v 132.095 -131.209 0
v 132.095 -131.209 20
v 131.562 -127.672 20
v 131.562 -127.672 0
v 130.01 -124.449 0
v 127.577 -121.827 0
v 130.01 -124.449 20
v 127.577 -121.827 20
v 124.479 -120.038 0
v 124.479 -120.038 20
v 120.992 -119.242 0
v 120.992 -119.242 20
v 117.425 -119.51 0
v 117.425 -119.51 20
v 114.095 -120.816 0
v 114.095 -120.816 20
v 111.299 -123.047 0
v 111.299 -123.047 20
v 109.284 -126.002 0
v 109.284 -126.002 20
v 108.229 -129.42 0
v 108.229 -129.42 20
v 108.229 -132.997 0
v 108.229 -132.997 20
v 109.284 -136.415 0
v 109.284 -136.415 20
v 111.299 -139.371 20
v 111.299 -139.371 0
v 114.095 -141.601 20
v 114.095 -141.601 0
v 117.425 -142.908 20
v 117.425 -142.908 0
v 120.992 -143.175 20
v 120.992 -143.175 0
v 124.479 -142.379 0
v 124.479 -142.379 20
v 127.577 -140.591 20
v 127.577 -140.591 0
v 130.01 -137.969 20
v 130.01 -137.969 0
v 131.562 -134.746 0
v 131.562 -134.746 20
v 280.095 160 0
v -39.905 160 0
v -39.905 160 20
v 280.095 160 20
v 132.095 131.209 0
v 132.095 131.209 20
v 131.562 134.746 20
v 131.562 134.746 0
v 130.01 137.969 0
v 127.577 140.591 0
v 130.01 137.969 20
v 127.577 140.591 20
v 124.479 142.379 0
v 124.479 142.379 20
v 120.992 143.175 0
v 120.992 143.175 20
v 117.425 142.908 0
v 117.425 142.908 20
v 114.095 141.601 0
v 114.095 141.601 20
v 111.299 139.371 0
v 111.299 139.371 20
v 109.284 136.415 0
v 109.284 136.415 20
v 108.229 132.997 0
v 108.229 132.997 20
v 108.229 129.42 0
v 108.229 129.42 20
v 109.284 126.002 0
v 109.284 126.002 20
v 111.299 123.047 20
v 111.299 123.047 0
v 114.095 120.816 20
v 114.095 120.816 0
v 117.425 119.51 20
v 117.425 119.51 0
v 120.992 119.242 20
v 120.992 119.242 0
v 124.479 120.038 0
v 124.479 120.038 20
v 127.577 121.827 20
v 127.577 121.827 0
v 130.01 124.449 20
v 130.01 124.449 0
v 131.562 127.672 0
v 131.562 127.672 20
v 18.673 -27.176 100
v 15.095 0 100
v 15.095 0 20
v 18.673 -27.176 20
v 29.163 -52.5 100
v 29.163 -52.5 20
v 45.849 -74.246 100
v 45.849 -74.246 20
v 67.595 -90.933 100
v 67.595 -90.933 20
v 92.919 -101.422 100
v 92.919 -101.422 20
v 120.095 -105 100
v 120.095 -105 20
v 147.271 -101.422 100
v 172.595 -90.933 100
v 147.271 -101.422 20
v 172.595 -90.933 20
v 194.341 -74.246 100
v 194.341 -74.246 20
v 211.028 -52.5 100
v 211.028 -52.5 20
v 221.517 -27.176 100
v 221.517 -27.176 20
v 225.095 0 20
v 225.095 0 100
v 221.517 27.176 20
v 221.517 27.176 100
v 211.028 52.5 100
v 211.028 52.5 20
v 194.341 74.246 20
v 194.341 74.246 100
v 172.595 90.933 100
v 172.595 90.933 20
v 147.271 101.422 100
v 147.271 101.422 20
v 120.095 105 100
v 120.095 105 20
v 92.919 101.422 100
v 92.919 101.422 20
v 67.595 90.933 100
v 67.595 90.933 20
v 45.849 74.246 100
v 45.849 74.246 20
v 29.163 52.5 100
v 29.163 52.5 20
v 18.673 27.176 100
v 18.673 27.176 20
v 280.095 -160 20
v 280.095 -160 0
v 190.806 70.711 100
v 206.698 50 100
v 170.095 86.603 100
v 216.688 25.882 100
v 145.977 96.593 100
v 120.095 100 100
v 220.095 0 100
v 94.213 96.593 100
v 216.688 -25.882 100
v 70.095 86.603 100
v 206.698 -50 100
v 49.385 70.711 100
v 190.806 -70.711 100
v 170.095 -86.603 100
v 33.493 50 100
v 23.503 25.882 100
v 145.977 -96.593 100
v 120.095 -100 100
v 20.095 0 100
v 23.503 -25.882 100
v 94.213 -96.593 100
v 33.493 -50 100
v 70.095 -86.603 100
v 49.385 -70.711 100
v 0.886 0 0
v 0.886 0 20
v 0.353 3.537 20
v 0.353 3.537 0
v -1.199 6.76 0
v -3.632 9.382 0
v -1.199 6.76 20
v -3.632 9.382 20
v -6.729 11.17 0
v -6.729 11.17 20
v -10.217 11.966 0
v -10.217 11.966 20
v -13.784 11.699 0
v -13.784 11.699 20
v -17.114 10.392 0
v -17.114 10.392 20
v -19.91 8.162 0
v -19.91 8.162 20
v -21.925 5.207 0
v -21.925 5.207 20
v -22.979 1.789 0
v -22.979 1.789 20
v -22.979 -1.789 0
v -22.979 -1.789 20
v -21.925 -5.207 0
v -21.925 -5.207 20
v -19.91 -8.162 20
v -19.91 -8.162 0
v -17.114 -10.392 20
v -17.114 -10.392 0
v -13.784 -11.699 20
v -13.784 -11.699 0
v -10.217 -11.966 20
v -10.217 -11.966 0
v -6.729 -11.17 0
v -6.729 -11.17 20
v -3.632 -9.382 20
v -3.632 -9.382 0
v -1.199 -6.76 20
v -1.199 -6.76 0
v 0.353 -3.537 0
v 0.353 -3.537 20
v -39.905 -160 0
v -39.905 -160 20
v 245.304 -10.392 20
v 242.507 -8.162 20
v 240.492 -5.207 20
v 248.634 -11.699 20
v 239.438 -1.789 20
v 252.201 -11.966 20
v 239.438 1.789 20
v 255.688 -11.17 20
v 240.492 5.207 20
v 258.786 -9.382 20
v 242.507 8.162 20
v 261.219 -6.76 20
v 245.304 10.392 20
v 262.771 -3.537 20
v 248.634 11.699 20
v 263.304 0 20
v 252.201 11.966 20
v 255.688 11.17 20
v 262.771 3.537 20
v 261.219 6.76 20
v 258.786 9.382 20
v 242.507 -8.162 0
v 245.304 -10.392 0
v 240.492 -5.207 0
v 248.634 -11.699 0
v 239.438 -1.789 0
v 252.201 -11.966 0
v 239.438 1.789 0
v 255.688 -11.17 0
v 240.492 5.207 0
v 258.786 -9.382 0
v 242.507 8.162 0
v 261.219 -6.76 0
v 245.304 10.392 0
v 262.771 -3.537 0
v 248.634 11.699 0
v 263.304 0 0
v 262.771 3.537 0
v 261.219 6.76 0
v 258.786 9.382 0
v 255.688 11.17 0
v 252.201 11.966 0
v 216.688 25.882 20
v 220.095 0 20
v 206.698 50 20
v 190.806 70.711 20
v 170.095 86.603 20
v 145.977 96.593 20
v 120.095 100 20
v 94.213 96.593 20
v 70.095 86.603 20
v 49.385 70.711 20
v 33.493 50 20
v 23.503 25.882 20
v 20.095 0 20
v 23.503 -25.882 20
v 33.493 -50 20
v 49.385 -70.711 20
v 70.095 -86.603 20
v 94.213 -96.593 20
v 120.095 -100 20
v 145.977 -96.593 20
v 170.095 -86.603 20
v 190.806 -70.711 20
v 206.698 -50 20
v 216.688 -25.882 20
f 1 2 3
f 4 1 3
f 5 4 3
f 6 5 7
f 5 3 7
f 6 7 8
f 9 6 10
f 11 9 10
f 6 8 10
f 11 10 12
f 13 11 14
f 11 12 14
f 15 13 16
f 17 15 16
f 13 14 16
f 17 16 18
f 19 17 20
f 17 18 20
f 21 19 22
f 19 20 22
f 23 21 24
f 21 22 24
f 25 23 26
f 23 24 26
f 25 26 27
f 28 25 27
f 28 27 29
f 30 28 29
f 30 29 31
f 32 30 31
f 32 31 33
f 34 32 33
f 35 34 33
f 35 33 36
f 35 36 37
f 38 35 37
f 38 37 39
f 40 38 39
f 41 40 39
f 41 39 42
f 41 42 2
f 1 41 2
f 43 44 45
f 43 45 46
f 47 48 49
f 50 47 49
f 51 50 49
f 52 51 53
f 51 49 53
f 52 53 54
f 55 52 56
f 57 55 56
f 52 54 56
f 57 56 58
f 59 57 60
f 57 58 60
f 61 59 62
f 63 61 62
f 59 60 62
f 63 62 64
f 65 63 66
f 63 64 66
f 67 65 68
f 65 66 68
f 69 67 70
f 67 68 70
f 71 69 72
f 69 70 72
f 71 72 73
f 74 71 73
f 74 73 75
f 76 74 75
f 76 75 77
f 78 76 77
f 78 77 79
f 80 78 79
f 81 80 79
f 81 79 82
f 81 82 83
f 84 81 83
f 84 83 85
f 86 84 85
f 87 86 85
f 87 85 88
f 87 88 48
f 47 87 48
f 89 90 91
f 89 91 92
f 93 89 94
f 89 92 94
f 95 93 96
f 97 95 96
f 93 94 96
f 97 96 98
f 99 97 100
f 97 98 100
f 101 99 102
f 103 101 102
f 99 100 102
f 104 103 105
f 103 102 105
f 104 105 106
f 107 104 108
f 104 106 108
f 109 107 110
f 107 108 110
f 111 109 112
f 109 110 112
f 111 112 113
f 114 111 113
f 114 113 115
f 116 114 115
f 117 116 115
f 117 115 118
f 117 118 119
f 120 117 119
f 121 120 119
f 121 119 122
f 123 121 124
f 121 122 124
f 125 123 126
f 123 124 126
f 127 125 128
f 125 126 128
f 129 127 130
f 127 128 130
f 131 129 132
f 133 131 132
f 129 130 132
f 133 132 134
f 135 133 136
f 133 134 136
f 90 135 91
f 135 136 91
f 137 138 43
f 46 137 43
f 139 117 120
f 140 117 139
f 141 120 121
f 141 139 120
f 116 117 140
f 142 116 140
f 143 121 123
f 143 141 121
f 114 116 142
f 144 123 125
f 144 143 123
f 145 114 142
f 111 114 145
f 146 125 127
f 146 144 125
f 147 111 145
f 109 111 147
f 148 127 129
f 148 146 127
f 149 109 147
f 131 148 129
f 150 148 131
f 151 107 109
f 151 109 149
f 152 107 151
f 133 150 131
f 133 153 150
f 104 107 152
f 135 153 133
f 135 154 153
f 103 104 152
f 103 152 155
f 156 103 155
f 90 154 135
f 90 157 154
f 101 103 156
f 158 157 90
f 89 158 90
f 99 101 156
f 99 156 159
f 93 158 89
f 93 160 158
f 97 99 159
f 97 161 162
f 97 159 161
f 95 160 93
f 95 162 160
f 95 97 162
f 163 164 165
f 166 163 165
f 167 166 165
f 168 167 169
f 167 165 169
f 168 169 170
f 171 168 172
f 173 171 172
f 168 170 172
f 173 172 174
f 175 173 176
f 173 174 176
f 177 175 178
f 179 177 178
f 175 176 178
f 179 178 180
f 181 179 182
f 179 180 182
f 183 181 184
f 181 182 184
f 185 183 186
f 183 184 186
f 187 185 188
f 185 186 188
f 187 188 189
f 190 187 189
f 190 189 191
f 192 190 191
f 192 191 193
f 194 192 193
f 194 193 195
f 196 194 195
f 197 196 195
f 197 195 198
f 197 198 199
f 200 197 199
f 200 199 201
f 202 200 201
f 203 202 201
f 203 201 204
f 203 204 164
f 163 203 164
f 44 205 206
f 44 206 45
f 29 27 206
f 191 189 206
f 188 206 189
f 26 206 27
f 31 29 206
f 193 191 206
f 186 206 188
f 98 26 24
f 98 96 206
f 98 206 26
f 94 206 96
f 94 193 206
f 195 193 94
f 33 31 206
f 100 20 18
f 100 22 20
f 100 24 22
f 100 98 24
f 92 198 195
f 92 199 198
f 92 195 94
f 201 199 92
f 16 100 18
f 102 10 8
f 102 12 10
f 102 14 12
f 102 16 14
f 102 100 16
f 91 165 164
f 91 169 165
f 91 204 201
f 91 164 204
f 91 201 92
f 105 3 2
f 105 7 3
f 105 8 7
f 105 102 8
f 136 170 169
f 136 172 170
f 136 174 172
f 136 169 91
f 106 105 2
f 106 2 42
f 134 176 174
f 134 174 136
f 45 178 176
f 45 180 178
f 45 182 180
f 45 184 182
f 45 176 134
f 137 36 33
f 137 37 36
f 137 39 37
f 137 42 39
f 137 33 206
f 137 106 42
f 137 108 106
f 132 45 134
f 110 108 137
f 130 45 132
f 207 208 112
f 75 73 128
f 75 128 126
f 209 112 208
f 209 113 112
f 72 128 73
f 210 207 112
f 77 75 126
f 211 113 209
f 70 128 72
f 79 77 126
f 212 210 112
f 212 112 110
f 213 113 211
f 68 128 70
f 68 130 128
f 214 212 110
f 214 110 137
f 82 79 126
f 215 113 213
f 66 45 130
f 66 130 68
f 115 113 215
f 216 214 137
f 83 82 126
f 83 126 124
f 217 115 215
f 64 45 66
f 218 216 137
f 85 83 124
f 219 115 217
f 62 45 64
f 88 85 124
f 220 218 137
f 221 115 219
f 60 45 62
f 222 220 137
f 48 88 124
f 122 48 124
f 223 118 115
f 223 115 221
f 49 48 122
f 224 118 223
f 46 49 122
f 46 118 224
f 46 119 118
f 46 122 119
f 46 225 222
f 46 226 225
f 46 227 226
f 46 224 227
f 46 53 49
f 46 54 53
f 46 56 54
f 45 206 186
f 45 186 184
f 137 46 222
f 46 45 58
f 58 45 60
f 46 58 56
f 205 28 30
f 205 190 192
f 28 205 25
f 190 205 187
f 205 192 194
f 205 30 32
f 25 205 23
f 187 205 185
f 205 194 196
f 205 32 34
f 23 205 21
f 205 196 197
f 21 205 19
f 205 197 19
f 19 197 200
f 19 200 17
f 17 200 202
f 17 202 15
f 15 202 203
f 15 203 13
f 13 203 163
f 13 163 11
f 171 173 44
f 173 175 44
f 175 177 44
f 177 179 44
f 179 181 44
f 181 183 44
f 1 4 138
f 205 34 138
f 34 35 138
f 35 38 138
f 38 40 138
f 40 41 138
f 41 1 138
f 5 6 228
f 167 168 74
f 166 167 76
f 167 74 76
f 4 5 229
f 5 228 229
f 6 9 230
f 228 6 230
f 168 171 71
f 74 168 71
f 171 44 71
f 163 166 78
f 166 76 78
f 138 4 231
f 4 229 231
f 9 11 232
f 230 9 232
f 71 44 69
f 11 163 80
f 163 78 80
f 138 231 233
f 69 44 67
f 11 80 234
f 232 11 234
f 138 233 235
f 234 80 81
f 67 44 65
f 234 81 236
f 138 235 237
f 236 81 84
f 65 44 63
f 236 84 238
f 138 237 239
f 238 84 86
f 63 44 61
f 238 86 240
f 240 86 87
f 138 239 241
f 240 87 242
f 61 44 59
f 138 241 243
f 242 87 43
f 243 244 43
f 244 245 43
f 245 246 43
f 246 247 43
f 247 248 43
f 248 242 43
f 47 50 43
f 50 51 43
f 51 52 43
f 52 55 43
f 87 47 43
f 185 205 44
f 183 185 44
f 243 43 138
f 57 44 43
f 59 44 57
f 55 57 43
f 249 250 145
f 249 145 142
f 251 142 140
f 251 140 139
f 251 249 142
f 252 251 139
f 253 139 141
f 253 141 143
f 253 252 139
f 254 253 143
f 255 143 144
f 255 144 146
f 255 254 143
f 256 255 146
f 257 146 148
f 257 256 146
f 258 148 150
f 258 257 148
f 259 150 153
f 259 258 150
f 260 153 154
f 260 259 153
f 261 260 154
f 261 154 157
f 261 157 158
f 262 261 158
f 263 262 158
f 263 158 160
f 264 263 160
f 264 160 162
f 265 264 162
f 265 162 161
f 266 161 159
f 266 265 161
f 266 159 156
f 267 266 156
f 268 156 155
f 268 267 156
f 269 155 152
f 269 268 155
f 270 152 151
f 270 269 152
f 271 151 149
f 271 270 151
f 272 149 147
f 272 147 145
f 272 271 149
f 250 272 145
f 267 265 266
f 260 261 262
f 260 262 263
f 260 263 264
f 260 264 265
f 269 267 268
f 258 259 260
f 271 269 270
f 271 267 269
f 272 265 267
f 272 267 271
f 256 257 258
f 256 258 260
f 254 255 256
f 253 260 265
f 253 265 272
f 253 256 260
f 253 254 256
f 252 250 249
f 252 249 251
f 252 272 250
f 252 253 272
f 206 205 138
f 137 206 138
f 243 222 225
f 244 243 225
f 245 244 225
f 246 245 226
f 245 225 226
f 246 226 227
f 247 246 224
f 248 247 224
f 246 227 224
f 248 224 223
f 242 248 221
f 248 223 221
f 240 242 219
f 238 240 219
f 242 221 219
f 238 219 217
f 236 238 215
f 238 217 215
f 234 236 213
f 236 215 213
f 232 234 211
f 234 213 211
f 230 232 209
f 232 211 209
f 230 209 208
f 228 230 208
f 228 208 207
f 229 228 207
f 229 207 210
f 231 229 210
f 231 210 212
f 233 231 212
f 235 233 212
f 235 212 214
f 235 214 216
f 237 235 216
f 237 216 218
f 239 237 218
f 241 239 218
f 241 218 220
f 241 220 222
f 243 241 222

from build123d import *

# Parameters (mm, degrees)
SKETCH1_W           = 320
SKETCH1_H           = 320
BOSS_EXTRUDE1_DEPTH = 20
SKETCH2_R           = 105
SKETCH2_R_2         = 100
BOSS_EXTRUDE2_DEPTH = 80
SKETCH4_R           = 12
CUT_EXTRUDE1_DEPTH  = 333.345210486


with BuildPart() as part:
    # Sketch1 → Boss-Extrude1 (new body)
    with BuildSketch(Plane.XY):
        with Locations((120.0952319, 0)):
            Rectangle(SKETCH1_W, SKETCH1_H)
    extrude(amount=BOSS_EXTRUDE1_DEPTH)

    # Sketch2 → Boss-Extrude2 (add)
    with BuildSketch(Plane.XY.offset(20)):
        with Locations(Location((120.0952319, 0, 0), (0, 0, 180))):
            Circle(SKETCH2_R)
        with Locations((120.0952319, 0)):
            Circle(SKETCH2_R_2, mode=Mode.SUBTRACT)
    extrude(amount=BOSS_EXTRUDE2_DEPTH)

    # Sketch4 → Cut-Extrude1 (cut, through all)
    with BuildSketch(Plane.XY.offset(20)):
        with Locations((120.0952319, 131.208738881)):
            Circle(SKETCH4_R)
        with Locations((251.303970781, 0)):
            Circle(SKETCH4_R)
        with Locations((120.0952319, -131.208738881)):
            Circle(SKETCH4_R)
        with Locations((-11.113506981, 0)):
            Circle(SKETCH4_R)
    extrude(amount=-CUT_EXTRUDE1_DEPTH, mode=Mode.SUBTRACT)


solid = part.part
